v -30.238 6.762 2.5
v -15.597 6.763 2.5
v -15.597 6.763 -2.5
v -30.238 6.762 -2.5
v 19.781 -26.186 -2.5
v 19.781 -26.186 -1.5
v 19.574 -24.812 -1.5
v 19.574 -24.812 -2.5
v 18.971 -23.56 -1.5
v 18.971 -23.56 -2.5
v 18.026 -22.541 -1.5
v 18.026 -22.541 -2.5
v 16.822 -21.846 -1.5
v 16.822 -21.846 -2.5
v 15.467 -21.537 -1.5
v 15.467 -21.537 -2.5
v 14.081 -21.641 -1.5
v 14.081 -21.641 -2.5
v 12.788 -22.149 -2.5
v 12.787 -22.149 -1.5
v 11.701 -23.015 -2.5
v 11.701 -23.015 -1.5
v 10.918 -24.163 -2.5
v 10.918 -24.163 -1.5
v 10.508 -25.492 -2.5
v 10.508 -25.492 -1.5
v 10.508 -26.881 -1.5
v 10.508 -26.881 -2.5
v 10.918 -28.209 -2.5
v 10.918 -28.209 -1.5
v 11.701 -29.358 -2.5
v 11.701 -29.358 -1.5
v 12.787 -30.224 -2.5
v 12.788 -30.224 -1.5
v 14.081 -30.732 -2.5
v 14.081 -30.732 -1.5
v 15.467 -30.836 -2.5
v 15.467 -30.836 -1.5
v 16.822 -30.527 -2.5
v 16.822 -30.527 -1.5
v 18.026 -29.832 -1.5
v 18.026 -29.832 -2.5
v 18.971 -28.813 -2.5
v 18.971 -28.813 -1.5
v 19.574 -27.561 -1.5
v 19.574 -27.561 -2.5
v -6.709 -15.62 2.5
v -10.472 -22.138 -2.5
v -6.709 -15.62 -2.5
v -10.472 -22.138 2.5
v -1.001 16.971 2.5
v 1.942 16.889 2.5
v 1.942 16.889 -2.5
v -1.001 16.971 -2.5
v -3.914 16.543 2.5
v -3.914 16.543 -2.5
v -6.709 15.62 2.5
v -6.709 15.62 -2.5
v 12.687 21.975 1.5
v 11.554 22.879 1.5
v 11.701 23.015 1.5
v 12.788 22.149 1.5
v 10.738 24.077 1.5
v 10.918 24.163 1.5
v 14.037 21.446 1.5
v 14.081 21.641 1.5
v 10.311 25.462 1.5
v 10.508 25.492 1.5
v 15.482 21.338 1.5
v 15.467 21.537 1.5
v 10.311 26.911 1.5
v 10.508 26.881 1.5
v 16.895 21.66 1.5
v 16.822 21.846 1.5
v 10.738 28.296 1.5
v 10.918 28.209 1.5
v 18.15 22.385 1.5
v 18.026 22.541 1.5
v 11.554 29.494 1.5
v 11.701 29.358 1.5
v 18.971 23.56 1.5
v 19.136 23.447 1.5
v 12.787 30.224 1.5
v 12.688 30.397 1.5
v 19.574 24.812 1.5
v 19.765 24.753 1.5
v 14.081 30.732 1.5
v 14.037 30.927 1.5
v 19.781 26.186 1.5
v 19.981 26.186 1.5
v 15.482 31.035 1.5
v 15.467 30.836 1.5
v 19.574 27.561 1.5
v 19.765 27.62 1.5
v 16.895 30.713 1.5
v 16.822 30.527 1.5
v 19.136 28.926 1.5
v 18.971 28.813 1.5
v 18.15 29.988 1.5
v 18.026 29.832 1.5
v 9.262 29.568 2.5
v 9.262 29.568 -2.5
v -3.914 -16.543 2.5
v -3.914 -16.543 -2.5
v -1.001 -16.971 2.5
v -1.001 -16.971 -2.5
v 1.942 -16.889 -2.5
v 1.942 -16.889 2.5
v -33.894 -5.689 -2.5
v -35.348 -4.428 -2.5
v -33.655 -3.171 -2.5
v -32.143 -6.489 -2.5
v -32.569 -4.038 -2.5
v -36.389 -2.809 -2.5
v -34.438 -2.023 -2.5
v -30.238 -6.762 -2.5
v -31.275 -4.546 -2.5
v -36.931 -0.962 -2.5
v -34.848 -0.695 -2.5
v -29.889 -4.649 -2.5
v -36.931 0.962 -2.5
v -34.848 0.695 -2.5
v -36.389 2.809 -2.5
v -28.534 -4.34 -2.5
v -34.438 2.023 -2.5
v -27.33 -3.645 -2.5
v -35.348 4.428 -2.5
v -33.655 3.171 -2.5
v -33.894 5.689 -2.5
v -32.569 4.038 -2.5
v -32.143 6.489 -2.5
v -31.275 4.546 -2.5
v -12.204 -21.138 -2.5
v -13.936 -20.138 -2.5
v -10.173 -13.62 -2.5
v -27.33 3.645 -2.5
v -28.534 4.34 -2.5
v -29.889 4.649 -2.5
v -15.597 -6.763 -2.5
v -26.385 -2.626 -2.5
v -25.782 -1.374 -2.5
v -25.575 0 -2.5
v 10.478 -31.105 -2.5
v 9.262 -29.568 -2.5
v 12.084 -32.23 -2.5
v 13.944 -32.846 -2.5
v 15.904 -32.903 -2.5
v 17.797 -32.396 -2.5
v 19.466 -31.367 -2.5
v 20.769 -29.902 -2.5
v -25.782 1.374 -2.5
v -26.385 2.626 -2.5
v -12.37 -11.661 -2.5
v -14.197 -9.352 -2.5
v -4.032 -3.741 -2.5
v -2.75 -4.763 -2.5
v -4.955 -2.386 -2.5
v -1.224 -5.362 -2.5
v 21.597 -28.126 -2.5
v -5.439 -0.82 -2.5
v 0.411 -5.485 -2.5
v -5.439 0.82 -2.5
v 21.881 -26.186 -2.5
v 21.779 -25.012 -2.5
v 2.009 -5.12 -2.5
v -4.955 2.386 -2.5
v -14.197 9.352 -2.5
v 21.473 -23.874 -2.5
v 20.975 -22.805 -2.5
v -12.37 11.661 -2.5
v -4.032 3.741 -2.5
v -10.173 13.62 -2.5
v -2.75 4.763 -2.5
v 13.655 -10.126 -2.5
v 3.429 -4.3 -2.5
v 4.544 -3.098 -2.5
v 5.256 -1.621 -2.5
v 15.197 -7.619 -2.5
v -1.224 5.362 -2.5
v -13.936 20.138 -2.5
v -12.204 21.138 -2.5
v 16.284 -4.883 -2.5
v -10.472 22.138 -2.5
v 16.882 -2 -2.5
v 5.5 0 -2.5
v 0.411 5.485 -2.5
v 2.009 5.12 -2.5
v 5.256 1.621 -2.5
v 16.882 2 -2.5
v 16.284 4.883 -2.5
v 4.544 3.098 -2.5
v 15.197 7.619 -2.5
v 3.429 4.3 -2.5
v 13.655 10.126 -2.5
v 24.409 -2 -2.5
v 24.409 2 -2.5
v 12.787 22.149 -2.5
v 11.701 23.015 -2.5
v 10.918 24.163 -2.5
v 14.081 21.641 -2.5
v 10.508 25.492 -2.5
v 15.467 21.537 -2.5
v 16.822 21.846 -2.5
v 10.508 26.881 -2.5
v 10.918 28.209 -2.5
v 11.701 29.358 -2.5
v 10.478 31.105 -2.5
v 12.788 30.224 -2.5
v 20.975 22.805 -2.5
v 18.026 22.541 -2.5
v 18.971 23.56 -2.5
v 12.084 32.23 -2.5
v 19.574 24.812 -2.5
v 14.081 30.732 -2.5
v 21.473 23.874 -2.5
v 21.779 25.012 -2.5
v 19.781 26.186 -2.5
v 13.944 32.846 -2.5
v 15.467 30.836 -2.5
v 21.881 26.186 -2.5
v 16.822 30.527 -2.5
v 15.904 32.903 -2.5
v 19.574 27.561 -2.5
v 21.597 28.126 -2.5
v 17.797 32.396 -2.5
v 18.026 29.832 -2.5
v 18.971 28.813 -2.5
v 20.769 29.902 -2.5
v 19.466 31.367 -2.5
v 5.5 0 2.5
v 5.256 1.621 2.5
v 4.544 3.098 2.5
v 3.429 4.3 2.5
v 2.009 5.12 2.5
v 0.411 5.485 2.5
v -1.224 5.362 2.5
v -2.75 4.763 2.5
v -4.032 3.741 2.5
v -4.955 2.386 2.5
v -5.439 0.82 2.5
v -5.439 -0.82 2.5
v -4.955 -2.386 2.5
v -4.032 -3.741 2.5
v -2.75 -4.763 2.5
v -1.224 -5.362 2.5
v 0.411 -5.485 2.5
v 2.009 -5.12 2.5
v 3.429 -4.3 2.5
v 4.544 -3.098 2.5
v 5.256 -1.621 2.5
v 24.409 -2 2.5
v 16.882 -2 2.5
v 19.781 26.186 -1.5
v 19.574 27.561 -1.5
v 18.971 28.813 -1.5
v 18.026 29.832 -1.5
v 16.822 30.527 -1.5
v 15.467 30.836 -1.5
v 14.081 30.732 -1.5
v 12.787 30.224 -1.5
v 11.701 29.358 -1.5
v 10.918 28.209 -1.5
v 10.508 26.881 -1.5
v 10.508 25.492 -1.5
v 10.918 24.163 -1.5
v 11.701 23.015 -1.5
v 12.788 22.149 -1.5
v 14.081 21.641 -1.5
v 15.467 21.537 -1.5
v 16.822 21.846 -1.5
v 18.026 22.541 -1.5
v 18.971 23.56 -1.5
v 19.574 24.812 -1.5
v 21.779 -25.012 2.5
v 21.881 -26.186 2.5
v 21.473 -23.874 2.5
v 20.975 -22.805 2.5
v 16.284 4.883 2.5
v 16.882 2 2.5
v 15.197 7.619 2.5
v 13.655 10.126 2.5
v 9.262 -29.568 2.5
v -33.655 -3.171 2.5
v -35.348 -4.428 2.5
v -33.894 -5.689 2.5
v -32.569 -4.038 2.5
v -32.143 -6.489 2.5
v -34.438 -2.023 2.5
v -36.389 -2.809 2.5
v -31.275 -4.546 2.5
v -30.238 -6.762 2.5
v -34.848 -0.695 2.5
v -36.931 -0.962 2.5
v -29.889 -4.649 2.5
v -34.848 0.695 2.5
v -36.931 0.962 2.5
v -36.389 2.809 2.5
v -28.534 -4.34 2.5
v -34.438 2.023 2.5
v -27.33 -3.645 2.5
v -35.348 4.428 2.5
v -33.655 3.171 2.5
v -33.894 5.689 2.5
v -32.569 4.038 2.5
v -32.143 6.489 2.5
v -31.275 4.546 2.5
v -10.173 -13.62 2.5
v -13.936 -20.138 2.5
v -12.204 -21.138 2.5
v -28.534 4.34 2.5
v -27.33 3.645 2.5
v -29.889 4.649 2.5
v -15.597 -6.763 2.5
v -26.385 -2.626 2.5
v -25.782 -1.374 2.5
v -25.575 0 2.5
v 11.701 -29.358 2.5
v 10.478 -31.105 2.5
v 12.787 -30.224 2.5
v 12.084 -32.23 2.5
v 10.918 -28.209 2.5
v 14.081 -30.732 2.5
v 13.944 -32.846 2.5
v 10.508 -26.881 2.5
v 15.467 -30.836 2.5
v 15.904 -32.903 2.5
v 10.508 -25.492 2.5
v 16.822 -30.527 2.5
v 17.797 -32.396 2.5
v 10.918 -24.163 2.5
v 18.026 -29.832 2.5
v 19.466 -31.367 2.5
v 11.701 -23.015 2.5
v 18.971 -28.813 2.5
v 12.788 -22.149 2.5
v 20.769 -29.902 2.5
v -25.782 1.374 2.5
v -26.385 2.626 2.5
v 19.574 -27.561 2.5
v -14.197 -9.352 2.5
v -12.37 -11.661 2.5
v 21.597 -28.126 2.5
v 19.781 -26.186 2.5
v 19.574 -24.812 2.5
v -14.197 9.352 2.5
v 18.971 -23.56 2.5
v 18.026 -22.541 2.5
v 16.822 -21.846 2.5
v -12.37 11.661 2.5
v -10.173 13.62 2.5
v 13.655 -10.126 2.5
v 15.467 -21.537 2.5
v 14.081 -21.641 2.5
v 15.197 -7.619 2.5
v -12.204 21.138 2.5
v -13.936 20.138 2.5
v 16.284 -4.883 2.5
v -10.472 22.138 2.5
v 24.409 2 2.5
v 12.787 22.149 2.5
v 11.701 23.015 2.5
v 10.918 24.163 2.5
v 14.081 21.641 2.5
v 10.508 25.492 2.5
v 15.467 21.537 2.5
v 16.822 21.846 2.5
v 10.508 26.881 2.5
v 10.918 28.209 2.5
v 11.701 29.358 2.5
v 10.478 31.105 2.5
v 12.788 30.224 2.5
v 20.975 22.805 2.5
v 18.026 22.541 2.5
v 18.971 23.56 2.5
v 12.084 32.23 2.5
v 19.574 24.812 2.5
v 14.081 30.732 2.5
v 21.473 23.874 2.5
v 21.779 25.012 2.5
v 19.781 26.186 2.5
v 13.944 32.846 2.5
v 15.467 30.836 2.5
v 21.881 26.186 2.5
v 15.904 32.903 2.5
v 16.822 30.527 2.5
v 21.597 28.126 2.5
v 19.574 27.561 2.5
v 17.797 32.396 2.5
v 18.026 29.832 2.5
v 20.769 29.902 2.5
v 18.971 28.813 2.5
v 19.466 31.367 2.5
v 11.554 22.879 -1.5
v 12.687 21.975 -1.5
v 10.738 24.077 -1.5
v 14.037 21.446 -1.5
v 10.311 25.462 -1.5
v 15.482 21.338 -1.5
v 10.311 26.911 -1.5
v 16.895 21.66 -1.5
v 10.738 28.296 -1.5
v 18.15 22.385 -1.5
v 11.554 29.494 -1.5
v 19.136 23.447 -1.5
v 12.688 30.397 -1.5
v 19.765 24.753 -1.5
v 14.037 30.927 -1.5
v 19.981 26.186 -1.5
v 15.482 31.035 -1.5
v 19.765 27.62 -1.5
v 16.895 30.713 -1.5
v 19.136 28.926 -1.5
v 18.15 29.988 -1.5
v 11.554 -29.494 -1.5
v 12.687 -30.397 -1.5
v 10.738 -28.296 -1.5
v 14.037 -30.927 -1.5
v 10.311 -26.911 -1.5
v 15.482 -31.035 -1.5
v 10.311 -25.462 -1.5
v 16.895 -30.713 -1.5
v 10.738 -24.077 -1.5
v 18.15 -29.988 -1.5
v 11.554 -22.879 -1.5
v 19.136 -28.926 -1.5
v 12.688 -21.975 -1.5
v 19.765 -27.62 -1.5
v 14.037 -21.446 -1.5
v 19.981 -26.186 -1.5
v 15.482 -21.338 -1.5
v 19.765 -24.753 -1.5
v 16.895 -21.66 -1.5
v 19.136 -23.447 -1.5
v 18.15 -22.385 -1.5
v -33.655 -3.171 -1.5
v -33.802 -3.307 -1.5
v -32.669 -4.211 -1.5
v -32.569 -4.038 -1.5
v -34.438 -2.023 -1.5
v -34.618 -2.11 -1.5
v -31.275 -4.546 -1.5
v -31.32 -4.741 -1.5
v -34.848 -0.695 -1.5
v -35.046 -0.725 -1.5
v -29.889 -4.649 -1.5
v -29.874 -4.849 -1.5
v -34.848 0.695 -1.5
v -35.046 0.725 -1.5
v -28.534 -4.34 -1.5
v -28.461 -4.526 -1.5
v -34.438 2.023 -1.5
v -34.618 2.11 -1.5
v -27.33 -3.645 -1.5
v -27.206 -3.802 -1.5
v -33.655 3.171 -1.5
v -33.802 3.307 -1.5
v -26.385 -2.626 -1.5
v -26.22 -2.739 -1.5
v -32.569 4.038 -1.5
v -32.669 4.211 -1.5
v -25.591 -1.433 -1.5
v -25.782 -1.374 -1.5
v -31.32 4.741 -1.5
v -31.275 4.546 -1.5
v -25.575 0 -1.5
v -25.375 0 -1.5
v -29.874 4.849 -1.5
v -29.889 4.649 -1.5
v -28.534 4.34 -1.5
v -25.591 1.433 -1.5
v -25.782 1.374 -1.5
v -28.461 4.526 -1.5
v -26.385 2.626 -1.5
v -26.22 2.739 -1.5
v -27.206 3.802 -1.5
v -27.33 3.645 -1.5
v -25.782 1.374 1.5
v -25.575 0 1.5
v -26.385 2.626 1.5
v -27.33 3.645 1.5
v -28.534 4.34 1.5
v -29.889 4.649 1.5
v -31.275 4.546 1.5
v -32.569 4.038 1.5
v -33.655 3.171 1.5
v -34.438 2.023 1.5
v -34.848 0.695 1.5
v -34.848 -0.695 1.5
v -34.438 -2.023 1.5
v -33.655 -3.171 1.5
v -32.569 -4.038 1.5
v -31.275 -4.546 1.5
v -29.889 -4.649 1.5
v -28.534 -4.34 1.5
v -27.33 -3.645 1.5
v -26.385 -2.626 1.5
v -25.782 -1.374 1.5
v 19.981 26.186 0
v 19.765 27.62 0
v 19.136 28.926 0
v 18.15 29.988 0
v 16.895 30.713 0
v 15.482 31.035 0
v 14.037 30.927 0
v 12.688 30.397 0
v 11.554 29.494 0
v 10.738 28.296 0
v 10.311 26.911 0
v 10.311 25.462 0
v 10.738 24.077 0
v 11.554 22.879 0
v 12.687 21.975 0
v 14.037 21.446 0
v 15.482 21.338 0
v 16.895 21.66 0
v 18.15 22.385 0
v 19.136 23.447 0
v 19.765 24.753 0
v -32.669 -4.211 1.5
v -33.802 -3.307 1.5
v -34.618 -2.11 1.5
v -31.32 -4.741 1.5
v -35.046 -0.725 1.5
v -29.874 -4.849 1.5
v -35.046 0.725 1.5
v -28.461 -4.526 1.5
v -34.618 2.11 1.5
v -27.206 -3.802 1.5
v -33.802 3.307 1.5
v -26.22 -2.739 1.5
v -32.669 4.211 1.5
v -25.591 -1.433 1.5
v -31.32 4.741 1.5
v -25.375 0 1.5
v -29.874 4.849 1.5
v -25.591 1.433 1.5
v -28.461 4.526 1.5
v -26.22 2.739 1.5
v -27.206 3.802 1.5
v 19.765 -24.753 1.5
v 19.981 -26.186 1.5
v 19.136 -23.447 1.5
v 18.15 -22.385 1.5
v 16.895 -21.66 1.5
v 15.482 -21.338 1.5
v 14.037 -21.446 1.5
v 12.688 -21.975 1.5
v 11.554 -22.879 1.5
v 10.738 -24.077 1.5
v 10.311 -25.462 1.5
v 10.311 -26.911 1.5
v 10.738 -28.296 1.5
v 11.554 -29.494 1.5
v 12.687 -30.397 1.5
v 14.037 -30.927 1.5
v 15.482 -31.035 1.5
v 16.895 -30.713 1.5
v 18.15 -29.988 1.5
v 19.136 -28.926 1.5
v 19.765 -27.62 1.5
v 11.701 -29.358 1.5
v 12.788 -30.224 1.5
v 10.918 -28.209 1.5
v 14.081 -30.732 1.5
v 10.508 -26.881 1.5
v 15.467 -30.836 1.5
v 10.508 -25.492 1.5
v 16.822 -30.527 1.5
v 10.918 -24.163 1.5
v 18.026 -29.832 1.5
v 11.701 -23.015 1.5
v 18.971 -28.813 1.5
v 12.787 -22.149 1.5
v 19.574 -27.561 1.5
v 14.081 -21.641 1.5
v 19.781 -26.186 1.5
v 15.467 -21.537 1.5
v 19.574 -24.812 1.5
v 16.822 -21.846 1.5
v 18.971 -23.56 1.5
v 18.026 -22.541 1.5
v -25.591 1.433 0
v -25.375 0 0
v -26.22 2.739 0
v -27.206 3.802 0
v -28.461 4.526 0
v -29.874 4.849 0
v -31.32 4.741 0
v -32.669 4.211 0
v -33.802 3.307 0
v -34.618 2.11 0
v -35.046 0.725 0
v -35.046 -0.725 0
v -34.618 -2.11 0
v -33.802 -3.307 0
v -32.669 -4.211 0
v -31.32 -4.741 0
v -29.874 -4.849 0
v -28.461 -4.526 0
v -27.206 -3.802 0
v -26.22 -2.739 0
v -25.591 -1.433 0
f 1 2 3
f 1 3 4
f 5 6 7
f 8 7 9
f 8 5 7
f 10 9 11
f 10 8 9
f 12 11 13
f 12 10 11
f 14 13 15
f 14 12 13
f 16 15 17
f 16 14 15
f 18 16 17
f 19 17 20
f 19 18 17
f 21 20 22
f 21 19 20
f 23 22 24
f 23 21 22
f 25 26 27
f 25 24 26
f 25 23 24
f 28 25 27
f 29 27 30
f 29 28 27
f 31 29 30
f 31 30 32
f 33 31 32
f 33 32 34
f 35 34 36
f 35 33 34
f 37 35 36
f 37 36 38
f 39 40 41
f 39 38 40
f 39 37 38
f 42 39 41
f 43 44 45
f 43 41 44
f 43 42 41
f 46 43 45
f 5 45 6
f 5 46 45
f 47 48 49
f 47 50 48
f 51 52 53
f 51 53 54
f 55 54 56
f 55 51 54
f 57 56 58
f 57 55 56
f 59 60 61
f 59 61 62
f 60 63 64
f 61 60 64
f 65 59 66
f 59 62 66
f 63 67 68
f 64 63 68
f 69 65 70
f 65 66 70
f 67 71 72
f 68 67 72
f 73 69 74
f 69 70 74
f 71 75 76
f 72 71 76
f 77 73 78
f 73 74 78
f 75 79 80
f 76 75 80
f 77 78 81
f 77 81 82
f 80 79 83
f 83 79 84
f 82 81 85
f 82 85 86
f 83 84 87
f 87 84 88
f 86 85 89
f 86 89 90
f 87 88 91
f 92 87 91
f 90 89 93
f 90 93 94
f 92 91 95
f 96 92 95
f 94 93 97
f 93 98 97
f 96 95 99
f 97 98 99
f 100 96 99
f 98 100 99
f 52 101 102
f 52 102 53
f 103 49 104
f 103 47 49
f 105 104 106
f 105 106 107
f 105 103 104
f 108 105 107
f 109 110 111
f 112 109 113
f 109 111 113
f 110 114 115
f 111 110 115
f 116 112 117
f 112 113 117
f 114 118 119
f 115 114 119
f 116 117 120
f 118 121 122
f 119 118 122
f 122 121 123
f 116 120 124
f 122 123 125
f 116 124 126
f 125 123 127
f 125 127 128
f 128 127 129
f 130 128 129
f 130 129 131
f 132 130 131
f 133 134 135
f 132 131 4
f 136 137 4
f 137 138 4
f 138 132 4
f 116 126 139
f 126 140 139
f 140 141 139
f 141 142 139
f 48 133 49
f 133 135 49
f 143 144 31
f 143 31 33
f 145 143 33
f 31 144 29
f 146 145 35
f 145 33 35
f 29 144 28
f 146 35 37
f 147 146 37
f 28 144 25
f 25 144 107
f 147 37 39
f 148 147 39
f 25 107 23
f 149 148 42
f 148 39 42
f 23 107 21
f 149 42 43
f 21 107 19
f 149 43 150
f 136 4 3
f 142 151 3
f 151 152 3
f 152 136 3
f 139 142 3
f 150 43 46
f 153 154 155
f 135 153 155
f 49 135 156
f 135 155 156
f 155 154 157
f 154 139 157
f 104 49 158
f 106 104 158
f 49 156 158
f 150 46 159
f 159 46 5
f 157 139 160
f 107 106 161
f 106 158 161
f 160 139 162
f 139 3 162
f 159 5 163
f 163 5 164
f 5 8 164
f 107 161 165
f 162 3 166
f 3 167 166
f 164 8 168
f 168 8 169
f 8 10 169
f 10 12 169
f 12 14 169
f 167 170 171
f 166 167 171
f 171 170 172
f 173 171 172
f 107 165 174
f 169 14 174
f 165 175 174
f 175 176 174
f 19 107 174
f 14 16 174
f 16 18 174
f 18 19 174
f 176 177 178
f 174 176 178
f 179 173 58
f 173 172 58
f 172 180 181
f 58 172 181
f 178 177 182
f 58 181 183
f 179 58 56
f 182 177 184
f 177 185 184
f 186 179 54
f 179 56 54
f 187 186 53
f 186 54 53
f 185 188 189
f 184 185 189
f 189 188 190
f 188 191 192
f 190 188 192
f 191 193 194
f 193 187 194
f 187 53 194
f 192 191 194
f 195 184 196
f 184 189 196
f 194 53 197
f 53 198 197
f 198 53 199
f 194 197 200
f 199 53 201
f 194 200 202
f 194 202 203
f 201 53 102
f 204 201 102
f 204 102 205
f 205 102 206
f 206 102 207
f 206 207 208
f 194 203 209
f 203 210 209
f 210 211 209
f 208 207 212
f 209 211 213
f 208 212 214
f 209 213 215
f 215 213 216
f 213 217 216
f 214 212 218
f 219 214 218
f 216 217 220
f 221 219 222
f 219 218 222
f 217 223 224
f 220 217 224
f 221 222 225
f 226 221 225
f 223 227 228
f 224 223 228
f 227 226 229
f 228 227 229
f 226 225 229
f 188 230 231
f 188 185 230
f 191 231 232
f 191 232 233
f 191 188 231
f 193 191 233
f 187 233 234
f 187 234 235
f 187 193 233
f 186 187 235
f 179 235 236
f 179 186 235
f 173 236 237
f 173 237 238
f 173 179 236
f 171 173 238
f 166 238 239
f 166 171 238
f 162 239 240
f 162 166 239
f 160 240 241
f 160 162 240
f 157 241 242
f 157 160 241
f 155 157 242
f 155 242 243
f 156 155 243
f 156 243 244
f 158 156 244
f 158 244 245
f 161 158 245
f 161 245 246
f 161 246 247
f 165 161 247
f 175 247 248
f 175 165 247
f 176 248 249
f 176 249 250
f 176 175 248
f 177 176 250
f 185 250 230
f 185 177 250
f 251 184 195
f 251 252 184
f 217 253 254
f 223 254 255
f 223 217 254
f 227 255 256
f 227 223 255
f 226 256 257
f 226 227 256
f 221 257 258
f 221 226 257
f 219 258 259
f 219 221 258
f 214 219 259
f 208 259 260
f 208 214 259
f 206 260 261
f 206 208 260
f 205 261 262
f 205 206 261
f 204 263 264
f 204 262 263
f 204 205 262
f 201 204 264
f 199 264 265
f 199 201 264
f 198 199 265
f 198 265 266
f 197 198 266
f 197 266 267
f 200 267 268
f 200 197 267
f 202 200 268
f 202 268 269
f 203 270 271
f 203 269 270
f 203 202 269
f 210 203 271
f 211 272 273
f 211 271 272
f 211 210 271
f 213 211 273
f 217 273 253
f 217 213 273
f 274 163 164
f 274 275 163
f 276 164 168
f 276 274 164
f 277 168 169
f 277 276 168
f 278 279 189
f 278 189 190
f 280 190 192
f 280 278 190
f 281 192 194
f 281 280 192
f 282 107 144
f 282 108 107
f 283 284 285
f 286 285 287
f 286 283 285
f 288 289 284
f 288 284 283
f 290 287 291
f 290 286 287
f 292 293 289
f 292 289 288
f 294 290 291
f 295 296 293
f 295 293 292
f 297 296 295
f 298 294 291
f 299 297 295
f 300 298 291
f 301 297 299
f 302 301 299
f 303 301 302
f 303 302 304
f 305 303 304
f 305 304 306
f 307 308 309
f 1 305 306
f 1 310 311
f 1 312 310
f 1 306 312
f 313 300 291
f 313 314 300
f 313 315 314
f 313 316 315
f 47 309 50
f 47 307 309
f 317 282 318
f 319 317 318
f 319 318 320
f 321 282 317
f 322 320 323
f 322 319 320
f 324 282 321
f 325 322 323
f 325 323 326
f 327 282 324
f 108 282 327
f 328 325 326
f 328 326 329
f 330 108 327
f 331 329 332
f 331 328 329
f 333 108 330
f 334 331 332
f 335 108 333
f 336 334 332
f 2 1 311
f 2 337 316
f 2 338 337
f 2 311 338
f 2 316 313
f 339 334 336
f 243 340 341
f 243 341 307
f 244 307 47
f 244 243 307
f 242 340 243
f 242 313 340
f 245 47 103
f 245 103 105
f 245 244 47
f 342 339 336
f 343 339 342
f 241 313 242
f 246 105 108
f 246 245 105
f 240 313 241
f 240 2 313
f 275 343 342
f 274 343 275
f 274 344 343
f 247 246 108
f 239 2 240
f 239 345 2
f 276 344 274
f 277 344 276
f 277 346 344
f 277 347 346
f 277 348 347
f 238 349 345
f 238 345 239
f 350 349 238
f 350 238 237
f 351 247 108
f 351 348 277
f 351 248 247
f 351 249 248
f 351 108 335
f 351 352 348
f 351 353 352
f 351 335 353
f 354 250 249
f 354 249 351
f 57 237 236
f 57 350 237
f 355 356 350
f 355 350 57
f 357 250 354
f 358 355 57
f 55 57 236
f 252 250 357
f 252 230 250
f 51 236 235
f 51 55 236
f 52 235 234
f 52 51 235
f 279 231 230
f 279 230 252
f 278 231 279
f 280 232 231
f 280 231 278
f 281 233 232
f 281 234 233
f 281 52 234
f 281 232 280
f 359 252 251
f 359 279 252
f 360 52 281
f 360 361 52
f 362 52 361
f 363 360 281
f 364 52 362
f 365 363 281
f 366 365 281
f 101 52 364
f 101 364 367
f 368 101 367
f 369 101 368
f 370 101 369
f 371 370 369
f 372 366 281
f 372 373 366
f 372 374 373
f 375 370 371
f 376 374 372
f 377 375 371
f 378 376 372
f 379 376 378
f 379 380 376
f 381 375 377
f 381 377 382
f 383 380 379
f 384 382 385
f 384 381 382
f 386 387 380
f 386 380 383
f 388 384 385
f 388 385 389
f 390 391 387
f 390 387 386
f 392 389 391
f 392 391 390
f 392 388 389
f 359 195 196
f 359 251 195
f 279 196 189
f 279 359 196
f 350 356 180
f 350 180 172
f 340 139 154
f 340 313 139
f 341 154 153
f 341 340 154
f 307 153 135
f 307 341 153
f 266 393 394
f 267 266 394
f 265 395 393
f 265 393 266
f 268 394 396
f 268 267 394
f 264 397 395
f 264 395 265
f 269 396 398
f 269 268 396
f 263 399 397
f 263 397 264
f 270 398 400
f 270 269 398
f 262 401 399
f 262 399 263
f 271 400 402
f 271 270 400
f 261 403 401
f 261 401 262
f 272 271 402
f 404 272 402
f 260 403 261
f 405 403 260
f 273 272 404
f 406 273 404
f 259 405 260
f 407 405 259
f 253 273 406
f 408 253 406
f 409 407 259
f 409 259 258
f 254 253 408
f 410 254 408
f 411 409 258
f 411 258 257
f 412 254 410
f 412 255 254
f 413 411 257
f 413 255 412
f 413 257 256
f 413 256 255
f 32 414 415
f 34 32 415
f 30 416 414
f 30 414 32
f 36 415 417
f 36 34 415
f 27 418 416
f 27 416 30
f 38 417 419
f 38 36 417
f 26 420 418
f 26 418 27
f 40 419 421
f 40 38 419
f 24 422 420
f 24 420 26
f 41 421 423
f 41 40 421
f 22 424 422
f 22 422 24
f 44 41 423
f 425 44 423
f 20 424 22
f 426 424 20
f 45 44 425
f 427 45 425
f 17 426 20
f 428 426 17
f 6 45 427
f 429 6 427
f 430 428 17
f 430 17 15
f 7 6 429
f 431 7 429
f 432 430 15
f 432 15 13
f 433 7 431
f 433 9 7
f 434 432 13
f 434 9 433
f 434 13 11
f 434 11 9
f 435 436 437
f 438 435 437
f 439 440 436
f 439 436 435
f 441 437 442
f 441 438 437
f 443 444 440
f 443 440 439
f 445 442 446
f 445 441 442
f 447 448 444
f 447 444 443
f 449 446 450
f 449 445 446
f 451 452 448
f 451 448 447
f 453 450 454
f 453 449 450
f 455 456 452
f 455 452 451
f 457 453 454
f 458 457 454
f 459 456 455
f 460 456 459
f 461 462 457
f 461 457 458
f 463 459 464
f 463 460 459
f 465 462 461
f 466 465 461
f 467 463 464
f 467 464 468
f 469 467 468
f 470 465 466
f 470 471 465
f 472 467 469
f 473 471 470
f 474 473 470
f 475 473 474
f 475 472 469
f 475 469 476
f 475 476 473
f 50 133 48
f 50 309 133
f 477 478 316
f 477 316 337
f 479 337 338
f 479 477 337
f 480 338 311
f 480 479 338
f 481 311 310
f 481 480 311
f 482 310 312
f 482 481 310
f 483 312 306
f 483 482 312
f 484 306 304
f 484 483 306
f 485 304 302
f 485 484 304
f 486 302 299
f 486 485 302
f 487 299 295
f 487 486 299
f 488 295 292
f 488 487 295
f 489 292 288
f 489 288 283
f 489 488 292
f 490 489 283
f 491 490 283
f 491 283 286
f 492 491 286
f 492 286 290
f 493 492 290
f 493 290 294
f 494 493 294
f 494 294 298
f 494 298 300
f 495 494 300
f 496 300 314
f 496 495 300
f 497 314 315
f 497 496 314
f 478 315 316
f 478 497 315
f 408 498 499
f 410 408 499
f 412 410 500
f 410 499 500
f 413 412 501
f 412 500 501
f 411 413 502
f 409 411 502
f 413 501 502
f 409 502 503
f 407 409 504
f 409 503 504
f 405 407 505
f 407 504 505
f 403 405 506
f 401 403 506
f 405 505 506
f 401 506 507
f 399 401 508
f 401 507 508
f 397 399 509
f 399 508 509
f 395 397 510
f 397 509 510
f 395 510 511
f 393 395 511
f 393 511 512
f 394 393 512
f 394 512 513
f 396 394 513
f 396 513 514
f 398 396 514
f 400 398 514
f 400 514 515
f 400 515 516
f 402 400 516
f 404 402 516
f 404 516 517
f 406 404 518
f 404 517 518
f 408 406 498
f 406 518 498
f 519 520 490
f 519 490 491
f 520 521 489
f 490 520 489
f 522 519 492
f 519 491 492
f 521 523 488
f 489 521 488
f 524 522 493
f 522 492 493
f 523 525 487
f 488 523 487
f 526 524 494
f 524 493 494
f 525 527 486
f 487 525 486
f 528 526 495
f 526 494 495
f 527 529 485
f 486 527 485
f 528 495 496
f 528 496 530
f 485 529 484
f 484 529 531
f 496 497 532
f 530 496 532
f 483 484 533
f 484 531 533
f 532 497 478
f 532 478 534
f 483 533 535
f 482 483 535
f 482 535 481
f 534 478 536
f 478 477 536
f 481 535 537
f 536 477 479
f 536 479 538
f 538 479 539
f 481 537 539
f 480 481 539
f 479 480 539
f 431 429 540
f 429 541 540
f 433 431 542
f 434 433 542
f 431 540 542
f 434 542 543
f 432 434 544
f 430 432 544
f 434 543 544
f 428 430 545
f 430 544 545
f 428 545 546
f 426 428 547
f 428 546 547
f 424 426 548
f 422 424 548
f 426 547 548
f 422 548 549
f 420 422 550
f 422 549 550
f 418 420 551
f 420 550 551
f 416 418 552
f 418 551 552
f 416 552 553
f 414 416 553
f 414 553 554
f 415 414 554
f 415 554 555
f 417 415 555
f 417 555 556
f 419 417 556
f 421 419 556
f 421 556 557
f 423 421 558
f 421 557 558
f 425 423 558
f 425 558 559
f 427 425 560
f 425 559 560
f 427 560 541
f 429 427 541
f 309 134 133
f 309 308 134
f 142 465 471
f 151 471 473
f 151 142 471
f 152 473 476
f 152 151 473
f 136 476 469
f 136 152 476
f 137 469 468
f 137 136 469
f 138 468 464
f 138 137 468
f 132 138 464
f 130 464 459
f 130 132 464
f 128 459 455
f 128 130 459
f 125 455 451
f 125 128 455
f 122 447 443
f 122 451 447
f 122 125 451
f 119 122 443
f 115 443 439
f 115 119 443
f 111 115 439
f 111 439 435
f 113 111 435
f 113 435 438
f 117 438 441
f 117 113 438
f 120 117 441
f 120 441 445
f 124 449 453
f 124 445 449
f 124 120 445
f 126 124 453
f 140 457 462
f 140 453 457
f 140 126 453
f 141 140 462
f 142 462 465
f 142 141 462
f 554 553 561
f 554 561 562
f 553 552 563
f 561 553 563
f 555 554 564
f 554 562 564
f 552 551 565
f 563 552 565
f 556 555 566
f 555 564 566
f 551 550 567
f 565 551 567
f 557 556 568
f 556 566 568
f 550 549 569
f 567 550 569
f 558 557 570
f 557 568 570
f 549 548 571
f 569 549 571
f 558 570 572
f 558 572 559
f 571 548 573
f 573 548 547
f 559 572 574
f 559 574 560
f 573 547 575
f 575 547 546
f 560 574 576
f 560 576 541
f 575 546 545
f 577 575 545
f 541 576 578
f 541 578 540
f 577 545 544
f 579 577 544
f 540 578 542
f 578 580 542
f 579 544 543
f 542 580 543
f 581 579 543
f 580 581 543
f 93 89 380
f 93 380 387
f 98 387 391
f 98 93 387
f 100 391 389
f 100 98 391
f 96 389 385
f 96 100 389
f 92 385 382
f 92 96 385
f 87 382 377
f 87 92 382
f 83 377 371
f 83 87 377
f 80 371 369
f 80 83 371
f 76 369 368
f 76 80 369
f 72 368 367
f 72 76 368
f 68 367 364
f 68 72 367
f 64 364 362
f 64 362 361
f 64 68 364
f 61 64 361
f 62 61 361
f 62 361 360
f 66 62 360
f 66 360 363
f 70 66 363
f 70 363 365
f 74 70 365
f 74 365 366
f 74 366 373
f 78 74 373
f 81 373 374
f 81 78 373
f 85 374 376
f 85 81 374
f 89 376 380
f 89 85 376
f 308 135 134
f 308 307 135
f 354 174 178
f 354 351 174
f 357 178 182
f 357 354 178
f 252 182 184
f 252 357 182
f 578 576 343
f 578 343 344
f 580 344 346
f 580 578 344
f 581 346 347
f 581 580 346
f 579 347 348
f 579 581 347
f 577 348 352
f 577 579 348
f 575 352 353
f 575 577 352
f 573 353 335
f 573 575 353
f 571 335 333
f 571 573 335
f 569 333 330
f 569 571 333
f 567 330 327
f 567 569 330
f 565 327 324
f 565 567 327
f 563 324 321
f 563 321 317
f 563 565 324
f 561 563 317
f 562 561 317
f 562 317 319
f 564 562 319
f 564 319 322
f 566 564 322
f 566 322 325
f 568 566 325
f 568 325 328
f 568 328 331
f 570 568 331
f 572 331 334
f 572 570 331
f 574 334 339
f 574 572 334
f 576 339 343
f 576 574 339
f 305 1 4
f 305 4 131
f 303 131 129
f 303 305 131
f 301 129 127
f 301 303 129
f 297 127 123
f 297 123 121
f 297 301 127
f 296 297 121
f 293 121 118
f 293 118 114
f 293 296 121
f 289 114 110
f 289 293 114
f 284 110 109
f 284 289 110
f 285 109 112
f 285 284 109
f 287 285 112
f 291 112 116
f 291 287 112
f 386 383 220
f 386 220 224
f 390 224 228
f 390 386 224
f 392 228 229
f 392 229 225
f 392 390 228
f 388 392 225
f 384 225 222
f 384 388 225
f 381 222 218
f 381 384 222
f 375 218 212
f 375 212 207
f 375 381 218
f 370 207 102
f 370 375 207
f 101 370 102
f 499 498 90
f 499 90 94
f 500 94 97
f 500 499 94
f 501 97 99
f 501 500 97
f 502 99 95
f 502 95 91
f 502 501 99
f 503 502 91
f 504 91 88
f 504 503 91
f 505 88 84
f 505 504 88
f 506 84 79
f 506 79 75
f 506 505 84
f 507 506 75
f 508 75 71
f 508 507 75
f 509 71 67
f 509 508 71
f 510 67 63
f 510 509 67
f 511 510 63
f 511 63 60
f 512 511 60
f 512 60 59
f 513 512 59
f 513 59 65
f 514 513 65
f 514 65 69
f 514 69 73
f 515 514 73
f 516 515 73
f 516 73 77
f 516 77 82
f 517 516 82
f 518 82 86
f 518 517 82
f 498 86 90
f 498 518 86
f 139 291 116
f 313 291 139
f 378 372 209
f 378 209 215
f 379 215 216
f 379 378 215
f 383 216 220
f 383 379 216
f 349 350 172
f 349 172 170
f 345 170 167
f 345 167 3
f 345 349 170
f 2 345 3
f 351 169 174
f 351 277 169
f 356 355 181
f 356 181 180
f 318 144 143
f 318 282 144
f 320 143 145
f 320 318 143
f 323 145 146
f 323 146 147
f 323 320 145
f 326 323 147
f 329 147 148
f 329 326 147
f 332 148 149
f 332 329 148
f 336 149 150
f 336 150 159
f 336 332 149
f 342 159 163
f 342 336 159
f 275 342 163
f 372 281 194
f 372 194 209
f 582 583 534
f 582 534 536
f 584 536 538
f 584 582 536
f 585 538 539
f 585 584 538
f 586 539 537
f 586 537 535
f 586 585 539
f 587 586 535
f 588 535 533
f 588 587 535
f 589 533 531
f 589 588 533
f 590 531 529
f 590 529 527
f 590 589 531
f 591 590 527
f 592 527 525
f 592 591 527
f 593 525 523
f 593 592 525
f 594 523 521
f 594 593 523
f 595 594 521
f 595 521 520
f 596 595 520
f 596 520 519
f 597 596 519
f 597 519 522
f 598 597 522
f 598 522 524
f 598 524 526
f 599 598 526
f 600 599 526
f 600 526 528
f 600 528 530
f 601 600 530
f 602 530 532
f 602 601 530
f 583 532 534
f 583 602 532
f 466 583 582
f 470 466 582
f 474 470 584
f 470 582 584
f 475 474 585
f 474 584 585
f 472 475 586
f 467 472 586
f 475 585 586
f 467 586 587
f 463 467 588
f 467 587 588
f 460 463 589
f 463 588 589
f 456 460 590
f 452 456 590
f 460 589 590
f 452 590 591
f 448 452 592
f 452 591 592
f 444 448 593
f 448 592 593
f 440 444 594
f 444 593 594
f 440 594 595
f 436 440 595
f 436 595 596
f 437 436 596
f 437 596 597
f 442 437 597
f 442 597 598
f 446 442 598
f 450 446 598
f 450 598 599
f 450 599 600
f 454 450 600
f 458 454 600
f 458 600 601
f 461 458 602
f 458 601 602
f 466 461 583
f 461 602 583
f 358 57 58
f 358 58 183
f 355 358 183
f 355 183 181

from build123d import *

# Parameters (mm, degrees)
F0_R     = 5.5
F0_R_2   = 4.6625
F1_DEPTH = 2.5
F2_R     = 4.8625
F3_DEPTH = 1.5


with BuildPart() as f1:
    # F0 (on Top) → F1 (new body, symmetric)
    with BuildSketch(Plane.XY):
        with BuildLine():
            Line((24.408629, 2), (16.881943, 2))
            ThreePointArc((16.881943, 2), (15.799858, 6.274111), (13.655032, 10.126209))
            Line((13.655032, 10.126209), (20.975247, 22.805193))
            ThreePointArc((20.975247, 22.805193), (11.7375, 20.329946), (9.262253, 29.567693))
            Line((9.262253, 29.567693), (1.942038, 16.888709))
            ThreePointArc((1.942038, 16.888709), (-2.466389, 16.820134), (-6.708921, 15.620192))
            Line((-6.708921, 15.620192), (-10.472264, 22.138493))
            Line((-10.472264, 22.138493), (-12.204315, 21.138493))
            Line((-12.204315, 21.138493), (-13.936365, 20.138493))
            Line((-13.936365, 20.138493), (-10.173022, 13.620192))
            ThreePointArc((-10.173022, 13.620192), (-13.333469, 10.546023), (-15.59707, 6.7625))
            Line((-15.59707, 6.7625), (-30.2375, 6.7625))
            ThreePointArc((-30.2375, 6.7625), (-25.45569, 4.78181), (-23.475, 0))
            ThreePointArc((-23.475, 0), (-25.45569, -4.78181), (-30.2375, -6.7625))
            Line((-30.2375, -6.7625), (-15.59707, -6.7625))
            ThreePointArc((-15.59707, -6.7625), (-13.333469, -10.546023), (-10.173022, -13.620192))
            Line((-10.173022, -13.620192), (-13.936365, -20.138493))
            Line((-13.936365, -20.138493), (-12.204315, -21.138493))
            Line((-12.204315, -21.138493), (-10.472264, -22.138493))
            Line((-10.472264, -22.138493), (-6.708921, -15.620192))
            ThreePointArc((-6.708921, -15.620192), (-2.466389, -16.820134), (1.942038, -16.888709))
            Line((1.942038, -16.888709), (9.262253, -29.567693))
            ThreePointArc((9.262253, -29.567693), (11.7375, -20.329946), (20.975247, -22.805193))
            Line((20.975247, -22.805193), (13.655032, -10.126209))
            ThreePointArc((13.655032, -10.126209), (15.799858, -6.274111), (16.881943, -2))
            Line((16.881943, -2), (24.408629, -2))
            Line((24.408629, -2), (24.408629, 0))
            Line((24.408629, 0), (24.408629, 2))
        make_face()
        Circle(F0_R, mode=Mode.SUBTRACT)
        with BuildLine():
            ThreePointArc((9.262253, 29.567693), (11.7375, 20.329946), (20.975247, 22.805193))
            ThreePointArc((20.975247, 22.805193), (21.650823, 24.436179), (21.88125, 26.186443))
            ThreePointArc((21.88125, 26.186443), (16.869014, 32.718517), (9.262253, 29.567693))
        make_face()
        with Locations((15.11875, 26.186443)):
            Circle(F0_R_2, mode=Mode.SUBTRACT)
        with BuildLine():
            ThreePointArc((21.88125, -26.186443), (21.650823, -24.436179), (20.975247, -22.805193))
            ThreePointArc((20.975247, -22.805193), (11.7375, -20.329946), (9.262253, -29.567693))
            ThreePointArc((9.262253, -29.567693), (16.869014, -32.718517), (21.88125, -26.186443))
        make_face()
        with Locations((15.11875, -26.186443)):
            Circle(F0_R_2, mode=Mode.SUBTRACT)
        with BuildLine():
            ThreePointArc((-23.475, 0), (-25.45569, 4.78181), (-30.2375, 6.7625))
            ThreePointArc((-30.2375, 6.7625), (-37, 0), (-30.2375, -6.7625))
            ThreePointArc((-30.2375, -6.7625), (-25.45569, -4.78181), (-23.475, 0))
        make_face()
        with Locations((-30.2375, 0)):
            Circle(F0_R_2, mode=Mode.SUBTRACT)
    extrude(amount=F1_DEPTH, both=True)

    # F2 (on Top) → F3 (cut, symmetric)
    with BuildSketch(Plane.XY):
        with Locations((-30.2375, 0)):
            Circle(F2_R)
        with Locations((15.11875, 26.186443)):
            Circle(F2_R)
        with Locations((15.11875, -26.186443)):
            Circle(F2_R)
    extrude(amount=F3_DEPTH, both=True, mode=Mode.SUBTRACT)


solid = f1.part
